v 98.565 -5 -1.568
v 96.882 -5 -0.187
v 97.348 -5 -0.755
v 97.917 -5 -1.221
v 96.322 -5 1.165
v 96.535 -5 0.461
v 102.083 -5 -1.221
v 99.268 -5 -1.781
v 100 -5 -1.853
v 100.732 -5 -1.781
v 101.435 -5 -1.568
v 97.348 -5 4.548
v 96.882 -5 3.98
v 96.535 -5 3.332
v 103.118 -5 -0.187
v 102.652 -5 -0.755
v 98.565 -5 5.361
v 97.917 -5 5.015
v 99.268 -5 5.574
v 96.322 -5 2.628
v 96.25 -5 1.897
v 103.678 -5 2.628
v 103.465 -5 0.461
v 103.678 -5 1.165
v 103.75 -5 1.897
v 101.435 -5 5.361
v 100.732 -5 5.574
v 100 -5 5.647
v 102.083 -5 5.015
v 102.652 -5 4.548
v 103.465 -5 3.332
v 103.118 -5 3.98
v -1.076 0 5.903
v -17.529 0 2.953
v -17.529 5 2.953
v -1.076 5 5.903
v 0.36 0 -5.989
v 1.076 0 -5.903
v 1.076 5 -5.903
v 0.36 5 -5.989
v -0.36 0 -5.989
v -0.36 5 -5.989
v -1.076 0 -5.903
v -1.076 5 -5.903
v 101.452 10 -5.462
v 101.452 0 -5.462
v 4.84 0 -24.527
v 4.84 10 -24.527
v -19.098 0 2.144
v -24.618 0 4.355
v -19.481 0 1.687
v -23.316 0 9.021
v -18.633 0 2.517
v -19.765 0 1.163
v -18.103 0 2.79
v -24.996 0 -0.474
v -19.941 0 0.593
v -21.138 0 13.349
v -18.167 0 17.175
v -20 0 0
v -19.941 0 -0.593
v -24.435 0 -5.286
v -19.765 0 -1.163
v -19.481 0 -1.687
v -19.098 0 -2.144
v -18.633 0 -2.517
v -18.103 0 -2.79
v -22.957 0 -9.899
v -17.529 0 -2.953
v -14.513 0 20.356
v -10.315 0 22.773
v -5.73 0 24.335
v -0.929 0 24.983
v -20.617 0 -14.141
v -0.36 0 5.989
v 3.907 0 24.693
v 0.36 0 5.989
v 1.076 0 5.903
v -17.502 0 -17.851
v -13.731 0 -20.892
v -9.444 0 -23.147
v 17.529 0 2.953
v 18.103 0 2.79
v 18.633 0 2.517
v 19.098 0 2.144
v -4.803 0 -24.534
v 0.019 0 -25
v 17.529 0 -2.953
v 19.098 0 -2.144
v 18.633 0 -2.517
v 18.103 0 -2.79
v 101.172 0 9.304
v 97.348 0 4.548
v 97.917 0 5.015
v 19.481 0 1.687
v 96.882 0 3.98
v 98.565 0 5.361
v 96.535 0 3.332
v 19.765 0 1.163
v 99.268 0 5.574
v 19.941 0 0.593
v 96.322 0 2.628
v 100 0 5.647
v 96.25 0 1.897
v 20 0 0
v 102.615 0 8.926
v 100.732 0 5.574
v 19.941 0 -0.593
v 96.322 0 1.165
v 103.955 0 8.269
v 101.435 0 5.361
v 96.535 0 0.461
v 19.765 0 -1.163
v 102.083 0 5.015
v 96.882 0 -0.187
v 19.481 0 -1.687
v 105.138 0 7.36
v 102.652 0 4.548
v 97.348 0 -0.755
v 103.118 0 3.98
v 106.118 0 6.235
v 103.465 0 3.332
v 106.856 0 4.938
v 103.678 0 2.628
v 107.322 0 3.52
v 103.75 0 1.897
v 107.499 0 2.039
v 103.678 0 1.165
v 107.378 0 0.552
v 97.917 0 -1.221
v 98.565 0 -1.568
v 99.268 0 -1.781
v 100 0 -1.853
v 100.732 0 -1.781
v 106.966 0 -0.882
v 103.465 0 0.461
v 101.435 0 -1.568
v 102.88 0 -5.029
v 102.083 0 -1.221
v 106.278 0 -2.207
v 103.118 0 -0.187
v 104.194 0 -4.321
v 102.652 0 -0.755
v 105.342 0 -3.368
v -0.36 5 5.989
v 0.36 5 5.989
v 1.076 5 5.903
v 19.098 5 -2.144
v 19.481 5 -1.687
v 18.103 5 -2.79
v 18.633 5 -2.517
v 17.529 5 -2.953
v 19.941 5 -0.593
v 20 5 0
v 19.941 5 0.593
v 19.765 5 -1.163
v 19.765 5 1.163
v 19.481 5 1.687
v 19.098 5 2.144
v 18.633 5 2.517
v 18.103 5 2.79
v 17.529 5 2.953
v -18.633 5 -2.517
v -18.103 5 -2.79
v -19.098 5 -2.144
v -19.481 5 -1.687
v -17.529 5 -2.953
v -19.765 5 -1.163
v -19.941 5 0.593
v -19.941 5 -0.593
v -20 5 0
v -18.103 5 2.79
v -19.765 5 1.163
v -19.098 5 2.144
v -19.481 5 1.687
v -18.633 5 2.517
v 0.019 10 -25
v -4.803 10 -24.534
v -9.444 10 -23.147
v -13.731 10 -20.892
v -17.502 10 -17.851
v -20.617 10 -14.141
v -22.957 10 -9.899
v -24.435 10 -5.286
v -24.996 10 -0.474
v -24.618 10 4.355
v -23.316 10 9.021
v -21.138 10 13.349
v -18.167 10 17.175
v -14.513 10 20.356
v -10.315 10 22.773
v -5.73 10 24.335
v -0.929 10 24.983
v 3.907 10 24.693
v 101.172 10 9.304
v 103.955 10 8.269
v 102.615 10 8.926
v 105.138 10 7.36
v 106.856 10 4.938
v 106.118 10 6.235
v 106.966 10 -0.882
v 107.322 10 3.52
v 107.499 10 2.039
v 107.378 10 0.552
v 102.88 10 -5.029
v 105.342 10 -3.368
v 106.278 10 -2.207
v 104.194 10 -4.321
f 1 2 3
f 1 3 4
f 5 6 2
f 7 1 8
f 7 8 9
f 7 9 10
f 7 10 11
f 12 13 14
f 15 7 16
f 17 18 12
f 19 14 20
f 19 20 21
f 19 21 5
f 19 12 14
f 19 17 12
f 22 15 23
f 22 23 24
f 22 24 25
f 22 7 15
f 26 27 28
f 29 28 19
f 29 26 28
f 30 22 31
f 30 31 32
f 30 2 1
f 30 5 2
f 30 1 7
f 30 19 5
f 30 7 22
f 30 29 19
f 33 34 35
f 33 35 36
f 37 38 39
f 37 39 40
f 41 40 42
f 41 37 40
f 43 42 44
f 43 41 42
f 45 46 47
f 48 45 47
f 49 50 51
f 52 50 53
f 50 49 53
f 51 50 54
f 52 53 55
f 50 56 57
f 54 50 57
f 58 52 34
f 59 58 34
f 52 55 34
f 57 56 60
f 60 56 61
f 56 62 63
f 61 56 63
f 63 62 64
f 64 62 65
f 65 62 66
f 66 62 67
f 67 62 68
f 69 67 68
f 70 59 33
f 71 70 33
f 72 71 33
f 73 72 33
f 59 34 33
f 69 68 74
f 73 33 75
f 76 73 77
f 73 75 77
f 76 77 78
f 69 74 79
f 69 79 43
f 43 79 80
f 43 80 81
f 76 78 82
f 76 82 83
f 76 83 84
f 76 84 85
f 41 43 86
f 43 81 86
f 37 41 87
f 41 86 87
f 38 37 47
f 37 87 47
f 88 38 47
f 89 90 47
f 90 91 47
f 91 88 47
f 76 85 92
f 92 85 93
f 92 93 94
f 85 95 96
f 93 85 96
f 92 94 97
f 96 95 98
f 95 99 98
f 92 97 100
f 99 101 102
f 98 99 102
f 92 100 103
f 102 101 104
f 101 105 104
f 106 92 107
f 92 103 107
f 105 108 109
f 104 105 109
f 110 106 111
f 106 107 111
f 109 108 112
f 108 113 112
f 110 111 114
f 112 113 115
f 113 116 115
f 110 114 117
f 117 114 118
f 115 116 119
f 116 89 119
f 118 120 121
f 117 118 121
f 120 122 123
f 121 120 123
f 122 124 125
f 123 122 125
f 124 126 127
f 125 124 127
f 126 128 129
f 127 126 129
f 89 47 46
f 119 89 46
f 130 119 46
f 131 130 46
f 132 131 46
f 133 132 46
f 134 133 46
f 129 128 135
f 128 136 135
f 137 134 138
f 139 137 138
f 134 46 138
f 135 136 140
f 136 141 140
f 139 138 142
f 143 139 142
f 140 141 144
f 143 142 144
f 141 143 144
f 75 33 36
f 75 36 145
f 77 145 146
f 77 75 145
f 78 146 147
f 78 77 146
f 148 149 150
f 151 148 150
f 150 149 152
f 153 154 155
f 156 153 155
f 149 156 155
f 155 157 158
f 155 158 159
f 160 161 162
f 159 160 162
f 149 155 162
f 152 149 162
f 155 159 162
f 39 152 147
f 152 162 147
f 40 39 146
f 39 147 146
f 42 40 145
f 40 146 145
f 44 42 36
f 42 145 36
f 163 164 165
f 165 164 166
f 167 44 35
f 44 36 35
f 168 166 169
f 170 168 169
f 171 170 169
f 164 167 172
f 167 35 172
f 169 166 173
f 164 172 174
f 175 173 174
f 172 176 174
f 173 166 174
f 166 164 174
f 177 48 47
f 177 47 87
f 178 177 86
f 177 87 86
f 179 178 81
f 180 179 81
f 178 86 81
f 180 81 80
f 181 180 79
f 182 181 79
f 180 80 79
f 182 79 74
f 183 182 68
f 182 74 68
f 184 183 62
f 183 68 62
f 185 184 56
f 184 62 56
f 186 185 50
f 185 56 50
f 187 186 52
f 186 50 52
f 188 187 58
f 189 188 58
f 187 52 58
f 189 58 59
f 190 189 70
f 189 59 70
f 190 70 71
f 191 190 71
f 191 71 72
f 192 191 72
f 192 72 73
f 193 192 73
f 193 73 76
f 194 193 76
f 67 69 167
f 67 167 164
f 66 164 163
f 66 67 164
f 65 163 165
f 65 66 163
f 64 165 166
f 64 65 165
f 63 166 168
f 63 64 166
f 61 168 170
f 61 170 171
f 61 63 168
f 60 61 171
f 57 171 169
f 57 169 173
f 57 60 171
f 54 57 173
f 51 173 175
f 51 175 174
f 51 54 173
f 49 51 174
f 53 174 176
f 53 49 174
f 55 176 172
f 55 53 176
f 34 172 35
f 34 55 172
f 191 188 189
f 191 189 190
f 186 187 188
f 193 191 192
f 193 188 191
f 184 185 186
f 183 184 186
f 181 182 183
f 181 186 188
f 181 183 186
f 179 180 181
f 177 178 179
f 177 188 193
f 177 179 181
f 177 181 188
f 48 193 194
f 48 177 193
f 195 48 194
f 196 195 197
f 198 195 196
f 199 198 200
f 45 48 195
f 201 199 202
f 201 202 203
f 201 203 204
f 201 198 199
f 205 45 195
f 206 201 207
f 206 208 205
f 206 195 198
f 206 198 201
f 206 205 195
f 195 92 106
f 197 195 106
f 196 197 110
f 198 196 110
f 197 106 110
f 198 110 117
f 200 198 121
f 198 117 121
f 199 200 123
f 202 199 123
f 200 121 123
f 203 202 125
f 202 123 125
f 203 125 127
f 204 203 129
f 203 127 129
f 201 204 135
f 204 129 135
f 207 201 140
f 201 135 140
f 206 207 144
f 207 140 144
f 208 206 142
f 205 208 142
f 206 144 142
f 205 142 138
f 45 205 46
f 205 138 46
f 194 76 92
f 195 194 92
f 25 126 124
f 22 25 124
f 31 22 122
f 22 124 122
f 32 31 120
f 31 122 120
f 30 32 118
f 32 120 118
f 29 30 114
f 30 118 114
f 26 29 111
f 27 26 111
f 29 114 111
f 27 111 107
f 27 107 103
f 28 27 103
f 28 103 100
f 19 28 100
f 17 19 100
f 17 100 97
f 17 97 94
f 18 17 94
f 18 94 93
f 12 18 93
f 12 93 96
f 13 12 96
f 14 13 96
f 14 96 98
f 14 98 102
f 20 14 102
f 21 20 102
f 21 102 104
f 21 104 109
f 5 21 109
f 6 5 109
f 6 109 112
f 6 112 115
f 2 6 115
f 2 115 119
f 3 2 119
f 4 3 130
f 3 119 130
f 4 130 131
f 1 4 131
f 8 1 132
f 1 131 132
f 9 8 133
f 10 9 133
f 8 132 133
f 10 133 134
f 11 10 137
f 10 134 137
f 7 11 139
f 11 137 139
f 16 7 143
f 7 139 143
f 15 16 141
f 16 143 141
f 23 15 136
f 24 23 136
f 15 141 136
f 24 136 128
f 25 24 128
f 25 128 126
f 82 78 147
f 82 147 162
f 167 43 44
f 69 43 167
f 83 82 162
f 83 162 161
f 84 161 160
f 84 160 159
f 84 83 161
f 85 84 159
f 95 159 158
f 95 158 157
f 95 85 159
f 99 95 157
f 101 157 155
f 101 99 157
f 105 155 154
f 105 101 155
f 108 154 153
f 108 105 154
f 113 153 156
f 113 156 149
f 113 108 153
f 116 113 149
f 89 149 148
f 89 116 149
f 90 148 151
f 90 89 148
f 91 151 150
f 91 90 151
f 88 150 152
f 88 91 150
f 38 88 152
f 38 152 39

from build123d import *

# Parameters (mm, degrees)
BOSS_EXTRUDE1_DEPTH = 10
SKETCH3_R           = 3.75
CUT_EXTRUDE1_DEPTH  = 5
SKETCH4_R           = 3.75
BOSS_EXTRUDE2_DEPTH = 10


with BuildPart() as part:
    # Sketch1 → Boss-Extrude1 (new body)
    with BuildSketch(Plane(origin=(0, 0, 0), x_dir=(1, 0, 0), z_dir=(0, 1, 0))):
        with BuildLine():
            Line((101.452048182, 5.461568526), (4.840160607, 24.526981985))
            ThreePointArc((4.840160607, 24.526981985), (-24.995505199, 0.474046272), (3.906693314, -24.69286835))
            Line((3.906693314, -24.69286835), (101.172007994, -9.304386575))
            ThreePointArc((101.172007994, -9.304386575), (107.49865156, -2.038739951), (101.452048182, 5.461568526))
        make_face()
    extrude(amount=BOSS_EXTRUDE1_DEPTH)

    # Sketch3 → Cut-Extrude1 (cut)
    with BuildSketch(Plane.XZ):
        with Locations((100, 1.89652607)):
            Circle(SKETCH3_R)
        with BuildLine():
            Line((17.529407273, -2.952918523), (1.075988404, -5.902732327))
            ThreePointArc((1.075988404, -5.902732327), (-9e-09, -6), (-1.075988422, -5.902732329))
            Line((-1.075988422, -5.902732329), (-17.529407298, -2.952918565))
            ThreePointArc((-17.529407298, -2.952918565), (-20.000000128, 0), (-17.529407298, 2.952918565))
            Line((-17.529407298, 2.952918565), (-1.075988422, 5.902732329))
            ThreePointArc((-1.075988422, 5.902732329), (-9e-09, 6), (1.075988404, 5.902732327))
            Line((1.075988404, 5.902732327), (17.529407273, 2.952918523))
            ThreePointArc((17.529407273, 2.952918523), (19.999999872, 0), (17.529407273, -2.952918523))
        make_face()
    extrude(amount=-CUT_EXTRUDE1_DEPTH, mode=Mode.SUBTRACT)

    # Sketch4 → Boss-Extrude2 (add)
    with BuildSketch(Plane.XZ.offset(-5)):
        with Locations((100, 1.89652607)):
            Circle(SKETCH4_R)
    extrude(amount=BOSS_EXTRUDE2_DEPTH)


solid = part.part
